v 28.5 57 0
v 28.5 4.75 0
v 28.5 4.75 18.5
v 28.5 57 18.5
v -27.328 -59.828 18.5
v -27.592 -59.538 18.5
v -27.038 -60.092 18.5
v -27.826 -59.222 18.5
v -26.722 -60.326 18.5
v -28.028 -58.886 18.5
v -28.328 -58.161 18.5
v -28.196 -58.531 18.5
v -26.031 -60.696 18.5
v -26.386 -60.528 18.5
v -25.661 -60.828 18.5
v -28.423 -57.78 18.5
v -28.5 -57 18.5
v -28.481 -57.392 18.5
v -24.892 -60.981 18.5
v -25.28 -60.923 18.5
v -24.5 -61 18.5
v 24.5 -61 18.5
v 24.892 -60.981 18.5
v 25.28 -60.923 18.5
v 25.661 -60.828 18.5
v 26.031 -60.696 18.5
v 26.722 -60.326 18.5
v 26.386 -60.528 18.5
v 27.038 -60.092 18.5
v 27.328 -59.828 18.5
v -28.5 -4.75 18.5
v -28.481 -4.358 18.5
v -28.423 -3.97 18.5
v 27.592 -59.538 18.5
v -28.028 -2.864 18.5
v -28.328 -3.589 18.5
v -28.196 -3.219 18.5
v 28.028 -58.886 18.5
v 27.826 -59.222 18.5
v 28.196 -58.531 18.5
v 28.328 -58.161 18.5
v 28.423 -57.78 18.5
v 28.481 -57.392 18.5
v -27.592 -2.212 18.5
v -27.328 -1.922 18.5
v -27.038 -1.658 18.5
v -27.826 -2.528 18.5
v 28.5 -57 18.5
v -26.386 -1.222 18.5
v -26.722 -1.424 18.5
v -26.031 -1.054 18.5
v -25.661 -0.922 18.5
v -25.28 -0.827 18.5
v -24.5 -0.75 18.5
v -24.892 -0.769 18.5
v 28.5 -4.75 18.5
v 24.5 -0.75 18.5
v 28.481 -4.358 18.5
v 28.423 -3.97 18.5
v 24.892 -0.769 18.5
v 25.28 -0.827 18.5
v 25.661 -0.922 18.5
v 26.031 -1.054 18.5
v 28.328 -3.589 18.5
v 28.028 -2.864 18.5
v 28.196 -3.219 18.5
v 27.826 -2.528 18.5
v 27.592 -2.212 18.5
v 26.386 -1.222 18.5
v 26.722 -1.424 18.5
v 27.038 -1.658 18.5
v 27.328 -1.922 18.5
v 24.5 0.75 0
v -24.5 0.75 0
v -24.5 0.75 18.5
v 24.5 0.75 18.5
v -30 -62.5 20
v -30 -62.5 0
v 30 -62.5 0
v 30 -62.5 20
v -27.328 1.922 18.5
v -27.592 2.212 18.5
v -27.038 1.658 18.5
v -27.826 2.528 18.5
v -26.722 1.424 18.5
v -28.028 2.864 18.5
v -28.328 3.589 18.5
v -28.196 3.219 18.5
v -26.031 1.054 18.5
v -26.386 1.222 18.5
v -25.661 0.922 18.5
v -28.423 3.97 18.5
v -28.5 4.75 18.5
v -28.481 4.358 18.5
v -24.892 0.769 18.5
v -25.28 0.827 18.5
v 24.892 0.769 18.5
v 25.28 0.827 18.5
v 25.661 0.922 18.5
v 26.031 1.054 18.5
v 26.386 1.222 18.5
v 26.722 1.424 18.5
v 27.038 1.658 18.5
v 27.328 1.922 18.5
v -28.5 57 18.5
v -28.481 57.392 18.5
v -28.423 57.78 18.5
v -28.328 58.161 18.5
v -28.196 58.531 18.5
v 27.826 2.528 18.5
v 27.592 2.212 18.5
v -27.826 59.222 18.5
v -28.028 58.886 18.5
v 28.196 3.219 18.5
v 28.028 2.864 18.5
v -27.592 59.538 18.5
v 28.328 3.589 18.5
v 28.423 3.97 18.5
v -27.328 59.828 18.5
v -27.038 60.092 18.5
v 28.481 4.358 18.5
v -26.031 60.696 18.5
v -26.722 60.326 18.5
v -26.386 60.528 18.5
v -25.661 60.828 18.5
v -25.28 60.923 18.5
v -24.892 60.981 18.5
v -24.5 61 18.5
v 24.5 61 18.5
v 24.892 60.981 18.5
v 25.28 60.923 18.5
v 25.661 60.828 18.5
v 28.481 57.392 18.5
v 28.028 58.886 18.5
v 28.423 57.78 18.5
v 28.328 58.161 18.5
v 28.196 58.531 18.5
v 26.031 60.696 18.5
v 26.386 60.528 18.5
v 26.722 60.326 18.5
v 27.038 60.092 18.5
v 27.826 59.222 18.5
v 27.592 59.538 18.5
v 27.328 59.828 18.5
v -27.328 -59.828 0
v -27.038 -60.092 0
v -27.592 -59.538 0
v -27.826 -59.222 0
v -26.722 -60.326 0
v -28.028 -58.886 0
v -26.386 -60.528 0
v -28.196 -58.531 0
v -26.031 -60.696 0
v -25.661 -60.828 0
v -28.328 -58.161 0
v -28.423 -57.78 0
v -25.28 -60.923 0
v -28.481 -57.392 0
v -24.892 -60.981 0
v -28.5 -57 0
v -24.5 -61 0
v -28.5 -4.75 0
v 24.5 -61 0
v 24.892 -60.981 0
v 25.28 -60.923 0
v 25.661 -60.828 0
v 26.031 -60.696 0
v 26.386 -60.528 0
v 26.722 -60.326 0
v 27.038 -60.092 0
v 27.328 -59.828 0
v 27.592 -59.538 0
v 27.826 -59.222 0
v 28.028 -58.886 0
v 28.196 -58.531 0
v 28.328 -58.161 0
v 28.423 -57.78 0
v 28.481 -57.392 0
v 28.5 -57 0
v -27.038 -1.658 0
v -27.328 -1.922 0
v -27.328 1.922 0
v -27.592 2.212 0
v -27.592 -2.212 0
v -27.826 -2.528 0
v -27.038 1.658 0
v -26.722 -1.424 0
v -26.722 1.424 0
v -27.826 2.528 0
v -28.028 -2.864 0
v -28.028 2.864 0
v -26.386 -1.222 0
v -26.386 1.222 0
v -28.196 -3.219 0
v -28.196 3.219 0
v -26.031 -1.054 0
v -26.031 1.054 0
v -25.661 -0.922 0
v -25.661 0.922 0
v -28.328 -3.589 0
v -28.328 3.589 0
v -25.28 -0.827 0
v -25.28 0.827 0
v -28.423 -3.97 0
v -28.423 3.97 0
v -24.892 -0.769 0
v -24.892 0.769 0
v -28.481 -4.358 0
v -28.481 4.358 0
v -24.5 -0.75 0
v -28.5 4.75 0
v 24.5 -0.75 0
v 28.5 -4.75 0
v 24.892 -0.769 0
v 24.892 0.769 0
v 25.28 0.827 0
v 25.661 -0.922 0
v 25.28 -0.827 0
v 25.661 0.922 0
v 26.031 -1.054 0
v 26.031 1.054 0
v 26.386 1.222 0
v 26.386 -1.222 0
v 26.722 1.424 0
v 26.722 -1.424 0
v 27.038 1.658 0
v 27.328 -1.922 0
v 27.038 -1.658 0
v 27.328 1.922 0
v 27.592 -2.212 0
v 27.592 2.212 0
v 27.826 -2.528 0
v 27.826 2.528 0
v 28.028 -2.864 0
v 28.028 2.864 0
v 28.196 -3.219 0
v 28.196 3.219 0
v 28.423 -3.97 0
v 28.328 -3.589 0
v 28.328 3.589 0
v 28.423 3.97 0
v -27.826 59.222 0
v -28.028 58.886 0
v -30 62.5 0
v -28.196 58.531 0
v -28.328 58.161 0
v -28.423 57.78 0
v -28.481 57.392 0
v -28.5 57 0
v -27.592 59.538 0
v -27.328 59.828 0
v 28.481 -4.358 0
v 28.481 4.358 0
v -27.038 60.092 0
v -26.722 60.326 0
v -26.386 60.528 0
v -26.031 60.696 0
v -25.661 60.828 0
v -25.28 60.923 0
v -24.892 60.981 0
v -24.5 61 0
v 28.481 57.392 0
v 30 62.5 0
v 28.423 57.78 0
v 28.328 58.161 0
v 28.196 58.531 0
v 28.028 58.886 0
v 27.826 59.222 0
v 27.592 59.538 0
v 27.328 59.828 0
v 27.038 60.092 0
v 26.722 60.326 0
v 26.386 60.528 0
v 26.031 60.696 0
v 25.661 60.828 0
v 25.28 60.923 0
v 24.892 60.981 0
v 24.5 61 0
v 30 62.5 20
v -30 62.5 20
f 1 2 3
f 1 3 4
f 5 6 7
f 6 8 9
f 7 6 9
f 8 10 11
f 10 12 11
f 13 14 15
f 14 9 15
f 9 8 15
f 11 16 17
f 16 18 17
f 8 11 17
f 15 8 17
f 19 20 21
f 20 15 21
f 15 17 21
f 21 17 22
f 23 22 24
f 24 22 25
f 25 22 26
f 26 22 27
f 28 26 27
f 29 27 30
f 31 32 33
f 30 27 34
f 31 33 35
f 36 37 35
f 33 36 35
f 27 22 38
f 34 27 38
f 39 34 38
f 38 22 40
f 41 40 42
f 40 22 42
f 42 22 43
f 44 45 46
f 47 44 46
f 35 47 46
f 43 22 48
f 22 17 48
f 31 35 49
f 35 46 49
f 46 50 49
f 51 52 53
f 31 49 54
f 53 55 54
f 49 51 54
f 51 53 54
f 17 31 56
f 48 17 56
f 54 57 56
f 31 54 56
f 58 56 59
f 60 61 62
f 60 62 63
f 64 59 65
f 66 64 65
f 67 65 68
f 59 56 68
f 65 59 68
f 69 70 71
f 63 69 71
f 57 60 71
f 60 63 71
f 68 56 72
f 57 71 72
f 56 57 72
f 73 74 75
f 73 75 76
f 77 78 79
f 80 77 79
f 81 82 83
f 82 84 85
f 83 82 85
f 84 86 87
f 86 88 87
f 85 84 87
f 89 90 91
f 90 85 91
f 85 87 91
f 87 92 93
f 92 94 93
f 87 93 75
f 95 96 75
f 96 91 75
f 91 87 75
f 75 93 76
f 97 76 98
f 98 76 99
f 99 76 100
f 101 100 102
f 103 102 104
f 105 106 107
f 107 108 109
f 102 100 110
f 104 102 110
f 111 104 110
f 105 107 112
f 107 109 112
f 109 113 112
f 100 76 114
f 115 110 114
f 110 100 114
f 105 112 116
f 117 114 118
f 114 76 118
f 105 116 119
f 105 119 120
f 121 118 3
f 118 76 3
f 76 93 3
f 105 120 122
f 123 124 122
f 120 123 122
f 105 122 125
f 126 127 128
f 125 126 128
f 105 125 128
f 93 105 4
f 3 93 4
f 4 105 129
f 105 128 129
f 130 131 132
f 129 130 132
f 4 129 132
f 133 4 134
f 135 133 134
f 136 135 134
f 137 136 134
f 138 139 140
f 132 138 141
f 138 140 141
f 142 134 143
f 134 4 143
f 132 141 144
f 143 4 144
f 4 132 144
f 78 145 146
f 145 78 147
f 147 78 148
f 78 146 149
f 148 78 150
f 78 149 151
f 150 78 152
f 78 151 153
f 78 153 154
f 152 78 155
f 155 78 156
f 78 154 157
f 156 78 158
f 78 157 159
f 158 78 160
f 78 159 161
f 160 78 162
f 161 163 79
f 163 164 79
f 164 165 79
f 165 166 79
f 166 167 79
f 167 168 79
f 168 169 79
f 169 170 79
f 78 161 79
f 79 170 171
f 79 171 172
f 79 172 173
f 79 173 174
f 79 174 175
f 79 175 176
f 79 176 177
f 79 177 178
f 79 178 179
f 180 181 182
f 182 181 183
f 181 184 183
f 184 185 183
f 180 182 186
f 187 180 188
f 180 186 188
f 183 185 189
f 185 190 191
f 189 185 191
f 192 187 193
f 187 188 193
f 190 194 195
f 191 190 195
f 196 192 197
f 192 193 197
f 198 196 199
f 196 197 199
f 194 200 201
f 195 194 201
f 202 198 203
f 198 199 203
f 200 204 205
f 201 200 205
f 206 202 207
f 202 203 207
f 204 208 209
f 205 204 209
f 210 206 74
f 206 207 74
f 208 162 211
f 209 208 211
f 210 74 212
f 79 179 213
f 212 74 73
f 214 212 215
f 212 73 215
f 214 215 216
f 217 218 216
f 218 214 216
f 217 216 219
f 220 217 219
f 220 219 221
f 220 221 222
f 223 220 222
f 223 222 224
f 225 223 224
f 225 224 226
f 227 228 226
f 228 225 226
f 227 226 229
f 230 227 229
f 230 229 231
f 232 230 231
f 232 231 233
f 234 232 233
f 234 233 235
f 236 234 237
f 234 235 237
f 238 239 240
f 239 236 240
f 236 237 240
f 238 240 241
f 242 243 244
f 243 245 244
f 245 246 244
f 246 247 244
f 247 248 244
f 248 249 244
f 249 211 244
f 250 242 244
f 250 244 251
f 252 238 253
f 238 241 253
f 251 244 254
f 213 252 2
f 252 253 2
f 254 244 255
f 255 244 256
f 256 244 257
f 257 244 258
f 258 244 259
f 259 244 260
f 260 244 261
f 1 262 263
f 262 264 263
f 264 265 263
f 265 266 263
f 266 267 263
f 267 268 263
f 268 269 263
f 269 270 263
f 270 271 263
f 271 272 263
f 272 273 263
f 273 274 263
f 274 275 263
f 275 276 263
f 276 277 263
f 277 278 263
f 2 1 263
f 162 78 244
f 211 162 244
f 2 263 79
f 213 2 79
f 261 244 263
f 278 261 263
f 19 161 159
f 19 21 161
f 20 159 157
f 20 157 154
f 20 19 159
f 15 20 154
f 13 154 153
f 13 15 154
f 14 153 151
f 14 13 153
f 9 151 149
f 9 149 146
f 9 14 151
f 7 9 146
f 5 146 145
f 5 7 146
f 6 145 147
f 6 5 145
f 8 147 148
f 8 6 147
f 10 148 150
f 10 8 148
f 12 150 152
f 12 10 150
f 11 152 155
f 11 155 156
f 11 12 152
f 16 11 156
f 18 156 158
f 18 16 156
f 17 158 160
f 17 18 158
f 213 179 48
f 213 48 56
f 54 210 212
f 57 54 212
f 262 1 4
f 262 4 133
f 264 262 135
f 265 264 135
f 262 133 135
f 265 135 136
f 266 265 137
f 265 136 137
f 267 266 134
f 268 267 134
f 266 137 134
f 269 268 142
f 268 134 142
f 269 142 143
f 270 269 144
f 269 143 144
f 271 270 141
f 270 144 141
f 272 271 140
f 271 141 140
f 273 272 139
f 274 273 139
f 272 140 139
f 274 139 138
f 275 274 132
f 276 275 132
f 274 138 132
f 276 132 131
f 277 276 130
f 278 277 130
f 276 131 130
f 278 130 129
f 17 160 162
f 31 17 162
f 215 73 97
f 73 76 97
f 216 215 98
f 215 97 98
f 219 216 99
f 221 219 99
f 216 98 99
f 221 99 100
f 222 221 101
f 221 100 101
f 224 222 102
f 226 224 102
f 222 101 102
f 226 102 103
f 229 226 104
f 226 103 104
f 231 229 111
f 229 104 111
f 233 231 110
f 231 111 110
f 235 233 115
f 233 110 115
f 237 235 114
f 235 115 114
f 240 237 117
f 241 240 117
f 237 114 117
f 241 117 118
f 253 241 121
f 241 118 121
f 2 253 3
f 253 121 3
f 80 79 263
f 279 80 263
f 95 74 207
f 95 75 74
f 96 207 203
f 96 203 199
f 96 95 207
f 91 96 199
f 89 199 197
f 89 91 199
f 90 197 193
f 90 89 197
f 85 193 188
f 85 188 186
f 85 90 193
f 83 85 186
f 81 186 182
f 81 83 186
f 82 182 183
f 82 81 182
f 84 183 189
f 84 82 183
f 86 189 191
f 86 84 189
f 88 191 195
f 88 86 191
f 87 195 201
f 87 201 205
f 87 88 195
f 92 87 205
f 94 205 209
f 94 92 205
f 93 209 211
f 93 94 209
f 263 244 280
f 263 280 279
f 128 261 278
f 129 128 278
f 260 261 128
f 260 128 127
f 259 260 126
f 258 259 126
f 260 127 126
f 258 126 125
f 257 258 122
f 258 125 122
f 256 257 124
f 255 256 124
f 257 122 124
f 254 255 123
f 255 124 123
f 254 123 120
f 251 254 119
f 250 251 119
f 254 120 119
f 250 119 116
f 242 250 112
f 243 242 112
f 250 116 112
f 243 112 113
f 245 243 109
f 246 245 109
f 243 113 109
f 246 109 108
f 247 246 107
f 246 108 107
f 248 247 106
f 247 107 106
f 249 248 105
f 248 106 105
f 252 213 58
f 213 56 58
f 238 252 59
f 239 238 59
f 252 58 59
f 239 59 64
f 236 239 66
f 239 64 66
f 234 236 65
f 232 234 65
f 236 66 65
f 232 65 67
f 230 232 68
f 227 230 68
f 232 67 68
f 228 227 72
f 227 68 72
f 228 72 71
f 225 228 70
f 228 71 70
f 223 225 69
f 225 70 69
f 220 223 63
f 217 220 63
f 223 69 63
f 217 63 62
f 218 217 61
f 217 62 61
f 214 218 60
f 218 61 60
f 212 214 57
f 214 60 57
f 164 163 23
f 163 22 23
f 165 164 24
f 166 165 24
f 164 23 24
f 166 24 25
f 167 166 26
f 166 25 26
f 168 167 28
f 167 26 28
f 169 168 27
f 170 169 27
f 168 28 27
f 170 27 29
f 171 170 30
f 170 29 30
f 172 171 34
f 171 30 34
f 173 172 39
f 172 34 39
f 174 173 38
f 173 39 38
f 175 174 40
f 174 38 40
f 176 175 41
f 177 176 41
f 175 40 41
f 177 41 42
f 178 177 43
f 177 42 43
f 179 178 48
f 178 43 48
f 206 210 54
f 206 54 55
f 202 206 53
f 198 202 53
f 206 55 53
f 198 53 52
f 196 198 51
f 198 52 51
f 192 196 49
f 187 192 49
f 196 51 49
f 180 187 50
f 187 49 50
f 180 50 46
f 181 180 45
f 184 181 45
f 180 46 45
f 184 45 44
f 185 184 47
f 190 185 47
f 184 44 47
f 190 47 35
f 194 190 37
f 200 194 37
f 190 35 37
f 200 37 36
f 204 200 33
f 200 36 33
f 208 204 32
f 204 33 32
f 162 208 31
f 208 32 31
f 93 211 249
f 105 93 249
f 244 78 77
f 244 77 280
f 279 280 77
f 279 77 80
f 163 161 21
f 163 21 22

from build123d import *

# Parameters (mm, degrees)
F0_W     = 60
F0_H     = 125
F1_DEPTH = 20
F2_W     = 57
F2_H     = 60.25
F3_DEPTH = 18.5
F4_R     = 4


with BuildPart() as f1:
    # F0 (on Top) → F1 (new body)
    with BuildSketch(Plane.XY):
        Rectangle(F0_W, F0_H)
    extrude(amount=F1_DEPTH)

    # F2 (on Top) → F3 (cut)
    with BuildSketch(Plane.XY):
        with Locations((0, 30.875)):
            Rectangle(F2_W, F2_H)
        with Locations((0, -30.875)):
            Rectangle(F2_W, F2_H)
    extrude(amount=F3_DEPTH, mode=Mode.SUBTRACT)

    # F4
    f4_edges = [f1.edges().sort_by_distance(p)[0] for p in [
        (28.5, -61, 9.25),
        (28.5, 0.75, 9.25),
        (-28.5, -61, 9.25),
        (-28.5, 0.75, 9.25),
        (-28.5, -0.75, 9.25),
        (-28.5, 61, 9.25),
        (28.5, 61, 9.25),
        (28.5, -0.75, 9.25),
    ]]
    fillet(f4_edges, radius=F4_R)


solid = f1.part
